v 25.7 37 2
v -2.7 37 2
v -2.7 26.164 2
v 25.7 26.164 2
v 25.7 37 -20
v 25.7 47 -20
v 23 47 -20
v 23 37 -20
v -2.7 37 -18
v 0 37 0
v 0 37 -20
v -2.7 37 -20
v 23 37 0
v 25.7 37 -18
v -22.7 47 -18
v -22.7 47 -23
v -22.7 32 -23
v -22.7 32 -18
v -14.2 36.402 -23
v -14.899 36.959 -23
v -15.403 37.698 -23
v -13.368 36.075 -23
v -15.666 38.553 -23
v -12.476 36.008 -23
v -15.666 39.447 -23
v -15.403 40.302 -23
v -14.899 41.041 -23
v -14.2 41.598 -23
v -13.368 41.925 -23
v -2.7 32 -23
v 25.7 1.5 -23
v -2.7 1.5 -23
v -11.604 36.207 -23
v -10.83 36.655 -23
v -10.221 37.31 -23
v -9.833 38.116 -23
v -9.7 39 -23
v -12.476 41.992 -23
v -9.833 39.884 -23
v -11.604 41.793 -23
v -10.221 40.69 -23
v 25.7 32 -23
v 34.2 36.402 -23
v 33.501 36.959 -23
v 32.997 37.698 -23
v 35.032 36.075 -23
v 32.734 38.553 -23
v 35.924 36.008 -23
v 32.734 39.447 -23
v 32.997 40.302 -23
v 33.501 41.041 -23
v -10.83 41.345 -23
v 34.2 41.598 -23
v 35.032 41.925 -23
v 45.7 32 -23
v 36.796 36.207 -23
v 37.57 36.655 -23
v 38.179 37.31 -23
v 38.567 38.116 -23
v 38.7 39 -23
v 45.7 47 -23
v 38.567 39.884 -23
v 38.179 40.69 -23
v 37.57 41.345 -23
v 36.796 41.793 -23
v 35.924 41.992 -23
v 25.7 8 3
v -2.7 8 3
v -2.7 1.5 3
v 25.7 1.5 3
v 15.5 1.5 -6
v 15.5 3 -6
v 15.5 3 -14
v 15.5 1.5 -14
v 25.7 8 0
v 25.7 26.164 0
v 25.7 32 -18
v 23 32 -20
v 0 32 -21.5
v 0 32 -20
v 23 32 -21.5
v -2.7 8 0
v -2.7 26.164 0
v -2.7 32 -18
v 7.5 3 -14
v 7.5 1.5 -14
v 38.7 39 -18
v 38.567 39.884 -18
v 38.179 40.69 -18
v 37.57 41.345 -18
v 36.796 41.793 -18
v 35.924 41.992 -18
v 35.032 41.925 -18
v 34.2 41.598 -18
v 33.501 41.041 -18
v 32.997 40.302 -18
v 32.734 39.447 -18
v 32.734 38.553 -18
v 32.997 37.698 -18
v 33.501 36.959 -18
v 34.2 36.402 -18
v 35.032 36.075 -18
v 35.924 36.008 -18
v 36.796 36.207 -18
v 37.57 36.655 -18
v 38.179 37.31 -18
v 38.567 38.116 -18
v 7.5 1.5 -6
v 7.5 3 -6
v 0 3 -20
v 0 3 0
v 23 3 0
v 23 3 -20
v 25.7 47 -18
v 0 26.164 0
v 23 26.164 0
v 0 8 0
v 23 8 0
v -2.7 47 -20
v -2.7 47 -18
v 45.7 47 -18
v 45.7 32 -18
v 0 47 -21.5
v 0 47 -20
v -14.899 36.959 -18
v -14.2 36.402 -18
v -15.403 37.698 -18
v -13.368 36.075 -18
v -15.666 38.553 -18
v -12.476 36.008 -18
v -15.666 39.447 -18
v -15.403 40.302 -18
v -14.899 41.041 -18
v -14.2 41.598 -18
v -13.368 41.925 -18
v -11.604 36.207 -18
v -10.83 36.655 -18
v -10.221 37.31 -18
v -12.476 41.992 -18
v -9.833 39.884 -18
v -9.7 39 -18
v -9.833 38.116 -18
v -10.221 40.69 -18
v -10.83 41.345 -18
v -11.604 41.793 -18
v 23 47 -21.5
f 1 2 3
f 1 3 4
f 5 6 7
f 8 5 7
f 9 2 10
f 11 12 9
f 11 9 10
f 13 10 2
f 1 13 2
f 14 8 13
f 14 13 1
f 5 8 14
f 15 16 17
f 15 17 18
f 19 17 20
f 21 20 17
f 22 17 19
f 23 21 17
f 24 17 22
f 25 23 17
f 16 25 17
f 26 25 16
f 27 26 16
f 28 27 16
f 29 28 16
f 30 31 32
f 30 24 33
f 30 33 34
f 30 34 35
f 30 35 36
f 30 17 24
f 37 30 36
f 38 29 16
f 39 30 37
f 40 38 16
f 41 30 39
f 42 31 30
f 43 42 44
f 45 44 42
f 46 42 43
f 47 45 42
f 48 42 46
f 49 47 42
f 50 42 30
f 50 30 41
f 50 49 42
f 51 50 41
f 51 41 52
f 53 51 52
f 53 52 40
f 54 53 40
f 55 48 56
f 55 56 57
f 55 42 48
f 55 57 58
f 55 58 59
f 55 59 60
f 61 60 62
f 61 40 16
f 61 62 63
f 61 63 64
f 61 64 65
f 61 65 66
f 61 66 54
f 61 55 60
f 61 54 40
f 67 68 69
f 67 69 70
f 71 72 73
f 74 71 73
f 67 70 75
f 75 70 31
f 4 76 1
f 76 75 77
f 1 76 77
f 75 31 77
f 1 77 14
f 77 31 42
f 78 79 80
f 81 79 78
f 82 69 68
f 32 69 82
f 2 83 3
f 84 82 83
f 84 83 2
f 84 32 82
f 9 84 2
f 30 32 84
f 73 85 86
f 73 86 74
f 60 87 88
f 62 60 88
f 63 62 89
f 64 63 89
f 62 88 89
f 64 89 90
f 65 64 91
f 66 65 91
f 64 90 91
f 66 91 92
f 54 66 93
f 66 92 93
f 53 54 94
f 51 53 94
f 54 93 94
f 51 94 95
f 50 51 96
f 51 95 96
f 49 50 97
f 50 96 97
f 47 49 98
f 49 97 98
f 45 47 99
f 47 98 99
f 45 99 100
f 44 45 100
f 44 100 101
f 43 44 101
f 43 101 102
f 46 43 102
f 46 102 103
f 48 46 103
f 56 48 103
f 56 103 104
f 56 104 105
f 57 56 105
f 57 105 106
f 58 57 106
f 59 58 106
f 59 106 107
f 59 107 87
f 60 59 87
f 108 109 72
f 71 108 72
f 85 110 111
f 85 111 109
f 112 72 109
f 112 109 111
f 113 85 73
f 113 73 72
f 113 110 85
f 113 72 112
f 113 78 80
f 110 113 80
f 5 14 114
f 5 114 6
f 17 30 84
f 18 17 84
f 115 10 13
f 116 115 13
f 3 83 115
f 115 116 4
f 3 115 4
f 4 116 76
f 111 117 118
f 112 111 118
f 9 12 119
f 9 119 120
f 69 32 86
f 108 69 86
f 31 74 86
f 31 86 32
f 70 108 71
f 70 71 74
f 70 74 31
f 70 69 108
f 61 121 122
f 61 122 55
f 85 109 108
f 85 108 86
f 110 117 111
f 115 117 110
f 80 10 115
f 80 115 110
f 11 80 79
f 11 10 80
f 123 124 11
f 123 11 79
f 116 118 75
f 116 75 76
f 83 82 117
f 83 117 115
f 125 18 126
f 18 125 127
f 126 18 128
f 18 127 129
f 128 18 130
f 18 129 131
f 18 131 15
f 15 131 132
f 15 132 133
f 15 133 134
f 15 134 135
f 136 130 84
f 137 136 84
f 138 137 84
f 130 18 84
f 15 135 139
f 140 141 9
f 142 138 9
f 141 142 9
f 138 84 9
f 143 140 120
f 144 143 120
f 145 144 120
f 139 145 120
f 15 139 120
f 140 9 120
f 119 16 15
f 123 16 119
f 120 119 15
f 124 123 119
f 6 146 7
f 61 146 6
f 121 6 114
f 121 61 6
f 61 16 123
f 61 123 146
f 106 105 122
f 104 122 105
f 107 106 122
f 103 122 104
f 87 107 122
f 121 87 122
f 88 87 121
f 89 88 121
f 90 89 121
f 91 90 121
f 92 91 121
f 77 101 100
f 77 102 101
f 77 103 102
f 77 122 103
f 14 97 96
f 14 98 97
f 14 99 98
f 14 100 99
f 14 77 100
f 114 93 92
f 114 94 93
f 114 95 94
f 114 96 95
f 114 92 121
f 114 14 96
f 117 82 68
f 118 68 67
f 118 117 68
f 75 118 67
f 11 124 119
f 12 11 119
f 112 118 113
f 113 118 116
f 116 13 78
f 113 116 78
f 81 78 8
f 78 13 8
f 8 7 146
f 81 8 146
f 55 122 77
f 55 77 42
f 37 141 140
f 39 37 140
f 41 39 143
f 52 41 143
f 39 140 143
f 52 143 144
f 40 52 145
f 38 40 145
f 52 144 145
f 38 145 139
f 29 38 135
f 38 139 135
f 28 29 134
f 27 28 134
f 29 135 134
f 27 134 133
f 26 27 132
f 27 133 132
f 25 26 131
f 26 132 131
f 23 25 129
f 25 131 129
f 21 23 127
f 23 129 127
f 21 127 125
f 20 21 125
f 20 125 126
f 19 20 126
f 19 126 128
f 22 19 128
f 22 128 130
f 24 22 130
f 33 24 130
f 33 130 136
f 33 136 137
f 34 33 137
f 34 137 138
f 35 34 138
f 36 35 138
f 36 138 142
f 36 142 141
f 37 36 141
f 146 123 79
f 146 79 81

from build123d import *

# Parameters (mm, degrees)
SKETCH1_W           = 23
SKETCH1_H           = 20
BOSS_EXTRUDE1_DEPTH = 3
SKETCH2_W           = 20
SKETCH2_H           = 37
BOSS_EXTRUDE2_DEPTH = 2.7
SKETCH3_W           = 20
SKETCH3_H           = 37
BOSS_EXTRUDE3_DEPTH = 2.7
SKETCH4_W           = 28.4
SKETCH4_H           = 8
BOSS_EXTRUDE4_DEPTH = 3
SKETCH5_W           = 28.4
SKETCH5_H           = 47
BOSS_EXTRUDE5_DEPTH = 3
SKETCH6_W           = 5
SKETCH6_H           = 15
BOSS_EXTRUDE6_DEPTH = 20
SKETCH7_W           = 5
SKETCH7_H           = 15
BOSS_EXTRUDE7_DEPTH = 20
SKETCH8_W           = 8
SKETCH8_H           = 8
CUT_EXTRUDE1_DEPTH  = 15
SKETCH9_R           = 3
CUT_EXTRUDE2_DEPTH  = 15
SKETCH10_W          = 28.45
SKETCH10_H          = 26
CUT_EXTRUDE3_DEPTH  = 1.5
SKETCH12_W          = 23
SKETCH12_H          = 1.5
CUT_EXTRUDE4_DEPTH  = 15
SKETCH13_W          = 28.4
SKETCH13_H          = 10.836340194
BOSS_EXTRUDE8_DEPTH = 2


with BuildPart() as part:
    # Sketch1 → Boss-Extrude1 (new body)
    with BuildSketch(Plane(origin=(0, 0, 0), x_dir=(1, 0, 0), z_dir=(0, 1, 0))):
        with Locations((11.5, 10)):
            Rectangle(SKETCH1_W, SKETCH1_H)
    extrude(amount=BOSS_EXTRUDE1_DEPTH)

    # Sketch2 → Boss-Extrude2 (add)
    with BuildSketch(Plane.ZY):
        with Locations((-10, 18.5)):
            Rectangle(SKETCH2_W, SKETCH2_H)
    extrude(amount=BOSS_EXTRUDE2_DEPTH)

    # Sketch3 → Boss-Extrude3 (add)
    with BuildSketch(Plane(origin=(23, 0, 0), x_dir=(0, 0, -1), z_dir=(1, 0, 0))):
        with Locations((10, 18.5)):
            Rectangle(SKETCH3_W, SKETCH3_H)
    extrude(amount=BOSS_EXTRUDE3_DEPTH)

    # Sketch4 → Boss-Extrude4 (add)
    with BuildSketch(Plane.XY):
        with Locations((11.5, 4)):
            Rectangle(SKETCH4_W, SKETCH4_H)
    extrude(amount=BOSS_EXTRUDE4_DEPTH)

    # Sketch5 → Boss-Extrude5 (add)
    with BuildSketch(Plane(origin=(0, 0, -20), x_dir=(-1, 0, 0), z_dir=(0, 0, -1))):
        with Locations((-11.5, 23.5)):
            Rectangle(SKETCH5_W, SKETCH5_H)
    extrude(amount=BOSS_EXTRUDE5_DEPTH)

    # Sketch6 → Boss-Extrude6 (add)
    with BuildSketch(Plane(origin=(25.7, 0, 0), x_dir=(0, 0, -1), z_dir=(1, 0, 0))):
        with Locations((20.5, 39.5)):
            Rectangle(SKETCH6_W, SKETCH6_H)
    extrude(amount=BOSS_EXTRUDE6_DEPTH)

    # Sketch7 → Boss-Extrude7 (add)
    with BuildSketch(Plane.ZY.offset(2.7)):
        with Locations((-20.5, 39.5)):
            Rectangle(SKETCH7_W, SKETCH7_H)
    extrude(amount=BOSS_EXTRUDE7_DEPTH)

    # Sketch8 → Cut-Extrude1 (cut)
    with BuildSketch(Plane(origin=(0, 3, 0), x_dir=(1, 0, 0), z_dir=(0, 1, 0))):
        with Locations((11.5, 10)):
            Rectangle(SKETCH8_W, SKETCH8_H)
    extrude(amount=-CUT_EXTRUDE1_DEPTH, mode=Mode.SUBTRACT)

    # Sketch9 → Cut-Extrude2 (cut)
    with BuildSketch(Plane.XY.offset(-18)):
        with Locations((-12.7, 39)):
            Circle(SKETCH9_R)
        with Locations((35.7, 39)):
            Circle(SKETCH9_R)
    extrude(amount=-CUT_EXTRUDE2_DEPTH, mode=Mode.SUBTRACT)

    # Sketch10 → Cut-Extrude3 (cut)
    with BuildSketch(Plane.XZ):
        with Locations((11.525, -10)):
            Rectangle(SKETCH10_W, SKETCH10_H)
    extrude(amount=-CUT_EXTRUDE3_DEPTH, mode=Mode.SUBTRACT)

    # Sketch12 → Cut-Extrude4 (cut)
    with BuildSketch(Plane(origin=(0, 47, 0), x_dir=(1, 0, 0), z_dir=(0, 1, 0))):
        with Locations((11.5, 20.75)):
            Rectangle(SKETCH12_W, SKETCH12_H)
    extrude(amount=-CUT_EXTRUDE4_DEPTH, mode=Mode.SUBTRACT)

    # Sketch13 → Boss-Extrude8 (add)
    with BuildSketch(Plane.XY):
        with Locations((11.5, 31.581829903)):
            Rectangle(SKETCH13_W, SKETCH13_H)
    extrude(amount=BOSS_EXTRUDE8_DEPTH)


solid = part.part
